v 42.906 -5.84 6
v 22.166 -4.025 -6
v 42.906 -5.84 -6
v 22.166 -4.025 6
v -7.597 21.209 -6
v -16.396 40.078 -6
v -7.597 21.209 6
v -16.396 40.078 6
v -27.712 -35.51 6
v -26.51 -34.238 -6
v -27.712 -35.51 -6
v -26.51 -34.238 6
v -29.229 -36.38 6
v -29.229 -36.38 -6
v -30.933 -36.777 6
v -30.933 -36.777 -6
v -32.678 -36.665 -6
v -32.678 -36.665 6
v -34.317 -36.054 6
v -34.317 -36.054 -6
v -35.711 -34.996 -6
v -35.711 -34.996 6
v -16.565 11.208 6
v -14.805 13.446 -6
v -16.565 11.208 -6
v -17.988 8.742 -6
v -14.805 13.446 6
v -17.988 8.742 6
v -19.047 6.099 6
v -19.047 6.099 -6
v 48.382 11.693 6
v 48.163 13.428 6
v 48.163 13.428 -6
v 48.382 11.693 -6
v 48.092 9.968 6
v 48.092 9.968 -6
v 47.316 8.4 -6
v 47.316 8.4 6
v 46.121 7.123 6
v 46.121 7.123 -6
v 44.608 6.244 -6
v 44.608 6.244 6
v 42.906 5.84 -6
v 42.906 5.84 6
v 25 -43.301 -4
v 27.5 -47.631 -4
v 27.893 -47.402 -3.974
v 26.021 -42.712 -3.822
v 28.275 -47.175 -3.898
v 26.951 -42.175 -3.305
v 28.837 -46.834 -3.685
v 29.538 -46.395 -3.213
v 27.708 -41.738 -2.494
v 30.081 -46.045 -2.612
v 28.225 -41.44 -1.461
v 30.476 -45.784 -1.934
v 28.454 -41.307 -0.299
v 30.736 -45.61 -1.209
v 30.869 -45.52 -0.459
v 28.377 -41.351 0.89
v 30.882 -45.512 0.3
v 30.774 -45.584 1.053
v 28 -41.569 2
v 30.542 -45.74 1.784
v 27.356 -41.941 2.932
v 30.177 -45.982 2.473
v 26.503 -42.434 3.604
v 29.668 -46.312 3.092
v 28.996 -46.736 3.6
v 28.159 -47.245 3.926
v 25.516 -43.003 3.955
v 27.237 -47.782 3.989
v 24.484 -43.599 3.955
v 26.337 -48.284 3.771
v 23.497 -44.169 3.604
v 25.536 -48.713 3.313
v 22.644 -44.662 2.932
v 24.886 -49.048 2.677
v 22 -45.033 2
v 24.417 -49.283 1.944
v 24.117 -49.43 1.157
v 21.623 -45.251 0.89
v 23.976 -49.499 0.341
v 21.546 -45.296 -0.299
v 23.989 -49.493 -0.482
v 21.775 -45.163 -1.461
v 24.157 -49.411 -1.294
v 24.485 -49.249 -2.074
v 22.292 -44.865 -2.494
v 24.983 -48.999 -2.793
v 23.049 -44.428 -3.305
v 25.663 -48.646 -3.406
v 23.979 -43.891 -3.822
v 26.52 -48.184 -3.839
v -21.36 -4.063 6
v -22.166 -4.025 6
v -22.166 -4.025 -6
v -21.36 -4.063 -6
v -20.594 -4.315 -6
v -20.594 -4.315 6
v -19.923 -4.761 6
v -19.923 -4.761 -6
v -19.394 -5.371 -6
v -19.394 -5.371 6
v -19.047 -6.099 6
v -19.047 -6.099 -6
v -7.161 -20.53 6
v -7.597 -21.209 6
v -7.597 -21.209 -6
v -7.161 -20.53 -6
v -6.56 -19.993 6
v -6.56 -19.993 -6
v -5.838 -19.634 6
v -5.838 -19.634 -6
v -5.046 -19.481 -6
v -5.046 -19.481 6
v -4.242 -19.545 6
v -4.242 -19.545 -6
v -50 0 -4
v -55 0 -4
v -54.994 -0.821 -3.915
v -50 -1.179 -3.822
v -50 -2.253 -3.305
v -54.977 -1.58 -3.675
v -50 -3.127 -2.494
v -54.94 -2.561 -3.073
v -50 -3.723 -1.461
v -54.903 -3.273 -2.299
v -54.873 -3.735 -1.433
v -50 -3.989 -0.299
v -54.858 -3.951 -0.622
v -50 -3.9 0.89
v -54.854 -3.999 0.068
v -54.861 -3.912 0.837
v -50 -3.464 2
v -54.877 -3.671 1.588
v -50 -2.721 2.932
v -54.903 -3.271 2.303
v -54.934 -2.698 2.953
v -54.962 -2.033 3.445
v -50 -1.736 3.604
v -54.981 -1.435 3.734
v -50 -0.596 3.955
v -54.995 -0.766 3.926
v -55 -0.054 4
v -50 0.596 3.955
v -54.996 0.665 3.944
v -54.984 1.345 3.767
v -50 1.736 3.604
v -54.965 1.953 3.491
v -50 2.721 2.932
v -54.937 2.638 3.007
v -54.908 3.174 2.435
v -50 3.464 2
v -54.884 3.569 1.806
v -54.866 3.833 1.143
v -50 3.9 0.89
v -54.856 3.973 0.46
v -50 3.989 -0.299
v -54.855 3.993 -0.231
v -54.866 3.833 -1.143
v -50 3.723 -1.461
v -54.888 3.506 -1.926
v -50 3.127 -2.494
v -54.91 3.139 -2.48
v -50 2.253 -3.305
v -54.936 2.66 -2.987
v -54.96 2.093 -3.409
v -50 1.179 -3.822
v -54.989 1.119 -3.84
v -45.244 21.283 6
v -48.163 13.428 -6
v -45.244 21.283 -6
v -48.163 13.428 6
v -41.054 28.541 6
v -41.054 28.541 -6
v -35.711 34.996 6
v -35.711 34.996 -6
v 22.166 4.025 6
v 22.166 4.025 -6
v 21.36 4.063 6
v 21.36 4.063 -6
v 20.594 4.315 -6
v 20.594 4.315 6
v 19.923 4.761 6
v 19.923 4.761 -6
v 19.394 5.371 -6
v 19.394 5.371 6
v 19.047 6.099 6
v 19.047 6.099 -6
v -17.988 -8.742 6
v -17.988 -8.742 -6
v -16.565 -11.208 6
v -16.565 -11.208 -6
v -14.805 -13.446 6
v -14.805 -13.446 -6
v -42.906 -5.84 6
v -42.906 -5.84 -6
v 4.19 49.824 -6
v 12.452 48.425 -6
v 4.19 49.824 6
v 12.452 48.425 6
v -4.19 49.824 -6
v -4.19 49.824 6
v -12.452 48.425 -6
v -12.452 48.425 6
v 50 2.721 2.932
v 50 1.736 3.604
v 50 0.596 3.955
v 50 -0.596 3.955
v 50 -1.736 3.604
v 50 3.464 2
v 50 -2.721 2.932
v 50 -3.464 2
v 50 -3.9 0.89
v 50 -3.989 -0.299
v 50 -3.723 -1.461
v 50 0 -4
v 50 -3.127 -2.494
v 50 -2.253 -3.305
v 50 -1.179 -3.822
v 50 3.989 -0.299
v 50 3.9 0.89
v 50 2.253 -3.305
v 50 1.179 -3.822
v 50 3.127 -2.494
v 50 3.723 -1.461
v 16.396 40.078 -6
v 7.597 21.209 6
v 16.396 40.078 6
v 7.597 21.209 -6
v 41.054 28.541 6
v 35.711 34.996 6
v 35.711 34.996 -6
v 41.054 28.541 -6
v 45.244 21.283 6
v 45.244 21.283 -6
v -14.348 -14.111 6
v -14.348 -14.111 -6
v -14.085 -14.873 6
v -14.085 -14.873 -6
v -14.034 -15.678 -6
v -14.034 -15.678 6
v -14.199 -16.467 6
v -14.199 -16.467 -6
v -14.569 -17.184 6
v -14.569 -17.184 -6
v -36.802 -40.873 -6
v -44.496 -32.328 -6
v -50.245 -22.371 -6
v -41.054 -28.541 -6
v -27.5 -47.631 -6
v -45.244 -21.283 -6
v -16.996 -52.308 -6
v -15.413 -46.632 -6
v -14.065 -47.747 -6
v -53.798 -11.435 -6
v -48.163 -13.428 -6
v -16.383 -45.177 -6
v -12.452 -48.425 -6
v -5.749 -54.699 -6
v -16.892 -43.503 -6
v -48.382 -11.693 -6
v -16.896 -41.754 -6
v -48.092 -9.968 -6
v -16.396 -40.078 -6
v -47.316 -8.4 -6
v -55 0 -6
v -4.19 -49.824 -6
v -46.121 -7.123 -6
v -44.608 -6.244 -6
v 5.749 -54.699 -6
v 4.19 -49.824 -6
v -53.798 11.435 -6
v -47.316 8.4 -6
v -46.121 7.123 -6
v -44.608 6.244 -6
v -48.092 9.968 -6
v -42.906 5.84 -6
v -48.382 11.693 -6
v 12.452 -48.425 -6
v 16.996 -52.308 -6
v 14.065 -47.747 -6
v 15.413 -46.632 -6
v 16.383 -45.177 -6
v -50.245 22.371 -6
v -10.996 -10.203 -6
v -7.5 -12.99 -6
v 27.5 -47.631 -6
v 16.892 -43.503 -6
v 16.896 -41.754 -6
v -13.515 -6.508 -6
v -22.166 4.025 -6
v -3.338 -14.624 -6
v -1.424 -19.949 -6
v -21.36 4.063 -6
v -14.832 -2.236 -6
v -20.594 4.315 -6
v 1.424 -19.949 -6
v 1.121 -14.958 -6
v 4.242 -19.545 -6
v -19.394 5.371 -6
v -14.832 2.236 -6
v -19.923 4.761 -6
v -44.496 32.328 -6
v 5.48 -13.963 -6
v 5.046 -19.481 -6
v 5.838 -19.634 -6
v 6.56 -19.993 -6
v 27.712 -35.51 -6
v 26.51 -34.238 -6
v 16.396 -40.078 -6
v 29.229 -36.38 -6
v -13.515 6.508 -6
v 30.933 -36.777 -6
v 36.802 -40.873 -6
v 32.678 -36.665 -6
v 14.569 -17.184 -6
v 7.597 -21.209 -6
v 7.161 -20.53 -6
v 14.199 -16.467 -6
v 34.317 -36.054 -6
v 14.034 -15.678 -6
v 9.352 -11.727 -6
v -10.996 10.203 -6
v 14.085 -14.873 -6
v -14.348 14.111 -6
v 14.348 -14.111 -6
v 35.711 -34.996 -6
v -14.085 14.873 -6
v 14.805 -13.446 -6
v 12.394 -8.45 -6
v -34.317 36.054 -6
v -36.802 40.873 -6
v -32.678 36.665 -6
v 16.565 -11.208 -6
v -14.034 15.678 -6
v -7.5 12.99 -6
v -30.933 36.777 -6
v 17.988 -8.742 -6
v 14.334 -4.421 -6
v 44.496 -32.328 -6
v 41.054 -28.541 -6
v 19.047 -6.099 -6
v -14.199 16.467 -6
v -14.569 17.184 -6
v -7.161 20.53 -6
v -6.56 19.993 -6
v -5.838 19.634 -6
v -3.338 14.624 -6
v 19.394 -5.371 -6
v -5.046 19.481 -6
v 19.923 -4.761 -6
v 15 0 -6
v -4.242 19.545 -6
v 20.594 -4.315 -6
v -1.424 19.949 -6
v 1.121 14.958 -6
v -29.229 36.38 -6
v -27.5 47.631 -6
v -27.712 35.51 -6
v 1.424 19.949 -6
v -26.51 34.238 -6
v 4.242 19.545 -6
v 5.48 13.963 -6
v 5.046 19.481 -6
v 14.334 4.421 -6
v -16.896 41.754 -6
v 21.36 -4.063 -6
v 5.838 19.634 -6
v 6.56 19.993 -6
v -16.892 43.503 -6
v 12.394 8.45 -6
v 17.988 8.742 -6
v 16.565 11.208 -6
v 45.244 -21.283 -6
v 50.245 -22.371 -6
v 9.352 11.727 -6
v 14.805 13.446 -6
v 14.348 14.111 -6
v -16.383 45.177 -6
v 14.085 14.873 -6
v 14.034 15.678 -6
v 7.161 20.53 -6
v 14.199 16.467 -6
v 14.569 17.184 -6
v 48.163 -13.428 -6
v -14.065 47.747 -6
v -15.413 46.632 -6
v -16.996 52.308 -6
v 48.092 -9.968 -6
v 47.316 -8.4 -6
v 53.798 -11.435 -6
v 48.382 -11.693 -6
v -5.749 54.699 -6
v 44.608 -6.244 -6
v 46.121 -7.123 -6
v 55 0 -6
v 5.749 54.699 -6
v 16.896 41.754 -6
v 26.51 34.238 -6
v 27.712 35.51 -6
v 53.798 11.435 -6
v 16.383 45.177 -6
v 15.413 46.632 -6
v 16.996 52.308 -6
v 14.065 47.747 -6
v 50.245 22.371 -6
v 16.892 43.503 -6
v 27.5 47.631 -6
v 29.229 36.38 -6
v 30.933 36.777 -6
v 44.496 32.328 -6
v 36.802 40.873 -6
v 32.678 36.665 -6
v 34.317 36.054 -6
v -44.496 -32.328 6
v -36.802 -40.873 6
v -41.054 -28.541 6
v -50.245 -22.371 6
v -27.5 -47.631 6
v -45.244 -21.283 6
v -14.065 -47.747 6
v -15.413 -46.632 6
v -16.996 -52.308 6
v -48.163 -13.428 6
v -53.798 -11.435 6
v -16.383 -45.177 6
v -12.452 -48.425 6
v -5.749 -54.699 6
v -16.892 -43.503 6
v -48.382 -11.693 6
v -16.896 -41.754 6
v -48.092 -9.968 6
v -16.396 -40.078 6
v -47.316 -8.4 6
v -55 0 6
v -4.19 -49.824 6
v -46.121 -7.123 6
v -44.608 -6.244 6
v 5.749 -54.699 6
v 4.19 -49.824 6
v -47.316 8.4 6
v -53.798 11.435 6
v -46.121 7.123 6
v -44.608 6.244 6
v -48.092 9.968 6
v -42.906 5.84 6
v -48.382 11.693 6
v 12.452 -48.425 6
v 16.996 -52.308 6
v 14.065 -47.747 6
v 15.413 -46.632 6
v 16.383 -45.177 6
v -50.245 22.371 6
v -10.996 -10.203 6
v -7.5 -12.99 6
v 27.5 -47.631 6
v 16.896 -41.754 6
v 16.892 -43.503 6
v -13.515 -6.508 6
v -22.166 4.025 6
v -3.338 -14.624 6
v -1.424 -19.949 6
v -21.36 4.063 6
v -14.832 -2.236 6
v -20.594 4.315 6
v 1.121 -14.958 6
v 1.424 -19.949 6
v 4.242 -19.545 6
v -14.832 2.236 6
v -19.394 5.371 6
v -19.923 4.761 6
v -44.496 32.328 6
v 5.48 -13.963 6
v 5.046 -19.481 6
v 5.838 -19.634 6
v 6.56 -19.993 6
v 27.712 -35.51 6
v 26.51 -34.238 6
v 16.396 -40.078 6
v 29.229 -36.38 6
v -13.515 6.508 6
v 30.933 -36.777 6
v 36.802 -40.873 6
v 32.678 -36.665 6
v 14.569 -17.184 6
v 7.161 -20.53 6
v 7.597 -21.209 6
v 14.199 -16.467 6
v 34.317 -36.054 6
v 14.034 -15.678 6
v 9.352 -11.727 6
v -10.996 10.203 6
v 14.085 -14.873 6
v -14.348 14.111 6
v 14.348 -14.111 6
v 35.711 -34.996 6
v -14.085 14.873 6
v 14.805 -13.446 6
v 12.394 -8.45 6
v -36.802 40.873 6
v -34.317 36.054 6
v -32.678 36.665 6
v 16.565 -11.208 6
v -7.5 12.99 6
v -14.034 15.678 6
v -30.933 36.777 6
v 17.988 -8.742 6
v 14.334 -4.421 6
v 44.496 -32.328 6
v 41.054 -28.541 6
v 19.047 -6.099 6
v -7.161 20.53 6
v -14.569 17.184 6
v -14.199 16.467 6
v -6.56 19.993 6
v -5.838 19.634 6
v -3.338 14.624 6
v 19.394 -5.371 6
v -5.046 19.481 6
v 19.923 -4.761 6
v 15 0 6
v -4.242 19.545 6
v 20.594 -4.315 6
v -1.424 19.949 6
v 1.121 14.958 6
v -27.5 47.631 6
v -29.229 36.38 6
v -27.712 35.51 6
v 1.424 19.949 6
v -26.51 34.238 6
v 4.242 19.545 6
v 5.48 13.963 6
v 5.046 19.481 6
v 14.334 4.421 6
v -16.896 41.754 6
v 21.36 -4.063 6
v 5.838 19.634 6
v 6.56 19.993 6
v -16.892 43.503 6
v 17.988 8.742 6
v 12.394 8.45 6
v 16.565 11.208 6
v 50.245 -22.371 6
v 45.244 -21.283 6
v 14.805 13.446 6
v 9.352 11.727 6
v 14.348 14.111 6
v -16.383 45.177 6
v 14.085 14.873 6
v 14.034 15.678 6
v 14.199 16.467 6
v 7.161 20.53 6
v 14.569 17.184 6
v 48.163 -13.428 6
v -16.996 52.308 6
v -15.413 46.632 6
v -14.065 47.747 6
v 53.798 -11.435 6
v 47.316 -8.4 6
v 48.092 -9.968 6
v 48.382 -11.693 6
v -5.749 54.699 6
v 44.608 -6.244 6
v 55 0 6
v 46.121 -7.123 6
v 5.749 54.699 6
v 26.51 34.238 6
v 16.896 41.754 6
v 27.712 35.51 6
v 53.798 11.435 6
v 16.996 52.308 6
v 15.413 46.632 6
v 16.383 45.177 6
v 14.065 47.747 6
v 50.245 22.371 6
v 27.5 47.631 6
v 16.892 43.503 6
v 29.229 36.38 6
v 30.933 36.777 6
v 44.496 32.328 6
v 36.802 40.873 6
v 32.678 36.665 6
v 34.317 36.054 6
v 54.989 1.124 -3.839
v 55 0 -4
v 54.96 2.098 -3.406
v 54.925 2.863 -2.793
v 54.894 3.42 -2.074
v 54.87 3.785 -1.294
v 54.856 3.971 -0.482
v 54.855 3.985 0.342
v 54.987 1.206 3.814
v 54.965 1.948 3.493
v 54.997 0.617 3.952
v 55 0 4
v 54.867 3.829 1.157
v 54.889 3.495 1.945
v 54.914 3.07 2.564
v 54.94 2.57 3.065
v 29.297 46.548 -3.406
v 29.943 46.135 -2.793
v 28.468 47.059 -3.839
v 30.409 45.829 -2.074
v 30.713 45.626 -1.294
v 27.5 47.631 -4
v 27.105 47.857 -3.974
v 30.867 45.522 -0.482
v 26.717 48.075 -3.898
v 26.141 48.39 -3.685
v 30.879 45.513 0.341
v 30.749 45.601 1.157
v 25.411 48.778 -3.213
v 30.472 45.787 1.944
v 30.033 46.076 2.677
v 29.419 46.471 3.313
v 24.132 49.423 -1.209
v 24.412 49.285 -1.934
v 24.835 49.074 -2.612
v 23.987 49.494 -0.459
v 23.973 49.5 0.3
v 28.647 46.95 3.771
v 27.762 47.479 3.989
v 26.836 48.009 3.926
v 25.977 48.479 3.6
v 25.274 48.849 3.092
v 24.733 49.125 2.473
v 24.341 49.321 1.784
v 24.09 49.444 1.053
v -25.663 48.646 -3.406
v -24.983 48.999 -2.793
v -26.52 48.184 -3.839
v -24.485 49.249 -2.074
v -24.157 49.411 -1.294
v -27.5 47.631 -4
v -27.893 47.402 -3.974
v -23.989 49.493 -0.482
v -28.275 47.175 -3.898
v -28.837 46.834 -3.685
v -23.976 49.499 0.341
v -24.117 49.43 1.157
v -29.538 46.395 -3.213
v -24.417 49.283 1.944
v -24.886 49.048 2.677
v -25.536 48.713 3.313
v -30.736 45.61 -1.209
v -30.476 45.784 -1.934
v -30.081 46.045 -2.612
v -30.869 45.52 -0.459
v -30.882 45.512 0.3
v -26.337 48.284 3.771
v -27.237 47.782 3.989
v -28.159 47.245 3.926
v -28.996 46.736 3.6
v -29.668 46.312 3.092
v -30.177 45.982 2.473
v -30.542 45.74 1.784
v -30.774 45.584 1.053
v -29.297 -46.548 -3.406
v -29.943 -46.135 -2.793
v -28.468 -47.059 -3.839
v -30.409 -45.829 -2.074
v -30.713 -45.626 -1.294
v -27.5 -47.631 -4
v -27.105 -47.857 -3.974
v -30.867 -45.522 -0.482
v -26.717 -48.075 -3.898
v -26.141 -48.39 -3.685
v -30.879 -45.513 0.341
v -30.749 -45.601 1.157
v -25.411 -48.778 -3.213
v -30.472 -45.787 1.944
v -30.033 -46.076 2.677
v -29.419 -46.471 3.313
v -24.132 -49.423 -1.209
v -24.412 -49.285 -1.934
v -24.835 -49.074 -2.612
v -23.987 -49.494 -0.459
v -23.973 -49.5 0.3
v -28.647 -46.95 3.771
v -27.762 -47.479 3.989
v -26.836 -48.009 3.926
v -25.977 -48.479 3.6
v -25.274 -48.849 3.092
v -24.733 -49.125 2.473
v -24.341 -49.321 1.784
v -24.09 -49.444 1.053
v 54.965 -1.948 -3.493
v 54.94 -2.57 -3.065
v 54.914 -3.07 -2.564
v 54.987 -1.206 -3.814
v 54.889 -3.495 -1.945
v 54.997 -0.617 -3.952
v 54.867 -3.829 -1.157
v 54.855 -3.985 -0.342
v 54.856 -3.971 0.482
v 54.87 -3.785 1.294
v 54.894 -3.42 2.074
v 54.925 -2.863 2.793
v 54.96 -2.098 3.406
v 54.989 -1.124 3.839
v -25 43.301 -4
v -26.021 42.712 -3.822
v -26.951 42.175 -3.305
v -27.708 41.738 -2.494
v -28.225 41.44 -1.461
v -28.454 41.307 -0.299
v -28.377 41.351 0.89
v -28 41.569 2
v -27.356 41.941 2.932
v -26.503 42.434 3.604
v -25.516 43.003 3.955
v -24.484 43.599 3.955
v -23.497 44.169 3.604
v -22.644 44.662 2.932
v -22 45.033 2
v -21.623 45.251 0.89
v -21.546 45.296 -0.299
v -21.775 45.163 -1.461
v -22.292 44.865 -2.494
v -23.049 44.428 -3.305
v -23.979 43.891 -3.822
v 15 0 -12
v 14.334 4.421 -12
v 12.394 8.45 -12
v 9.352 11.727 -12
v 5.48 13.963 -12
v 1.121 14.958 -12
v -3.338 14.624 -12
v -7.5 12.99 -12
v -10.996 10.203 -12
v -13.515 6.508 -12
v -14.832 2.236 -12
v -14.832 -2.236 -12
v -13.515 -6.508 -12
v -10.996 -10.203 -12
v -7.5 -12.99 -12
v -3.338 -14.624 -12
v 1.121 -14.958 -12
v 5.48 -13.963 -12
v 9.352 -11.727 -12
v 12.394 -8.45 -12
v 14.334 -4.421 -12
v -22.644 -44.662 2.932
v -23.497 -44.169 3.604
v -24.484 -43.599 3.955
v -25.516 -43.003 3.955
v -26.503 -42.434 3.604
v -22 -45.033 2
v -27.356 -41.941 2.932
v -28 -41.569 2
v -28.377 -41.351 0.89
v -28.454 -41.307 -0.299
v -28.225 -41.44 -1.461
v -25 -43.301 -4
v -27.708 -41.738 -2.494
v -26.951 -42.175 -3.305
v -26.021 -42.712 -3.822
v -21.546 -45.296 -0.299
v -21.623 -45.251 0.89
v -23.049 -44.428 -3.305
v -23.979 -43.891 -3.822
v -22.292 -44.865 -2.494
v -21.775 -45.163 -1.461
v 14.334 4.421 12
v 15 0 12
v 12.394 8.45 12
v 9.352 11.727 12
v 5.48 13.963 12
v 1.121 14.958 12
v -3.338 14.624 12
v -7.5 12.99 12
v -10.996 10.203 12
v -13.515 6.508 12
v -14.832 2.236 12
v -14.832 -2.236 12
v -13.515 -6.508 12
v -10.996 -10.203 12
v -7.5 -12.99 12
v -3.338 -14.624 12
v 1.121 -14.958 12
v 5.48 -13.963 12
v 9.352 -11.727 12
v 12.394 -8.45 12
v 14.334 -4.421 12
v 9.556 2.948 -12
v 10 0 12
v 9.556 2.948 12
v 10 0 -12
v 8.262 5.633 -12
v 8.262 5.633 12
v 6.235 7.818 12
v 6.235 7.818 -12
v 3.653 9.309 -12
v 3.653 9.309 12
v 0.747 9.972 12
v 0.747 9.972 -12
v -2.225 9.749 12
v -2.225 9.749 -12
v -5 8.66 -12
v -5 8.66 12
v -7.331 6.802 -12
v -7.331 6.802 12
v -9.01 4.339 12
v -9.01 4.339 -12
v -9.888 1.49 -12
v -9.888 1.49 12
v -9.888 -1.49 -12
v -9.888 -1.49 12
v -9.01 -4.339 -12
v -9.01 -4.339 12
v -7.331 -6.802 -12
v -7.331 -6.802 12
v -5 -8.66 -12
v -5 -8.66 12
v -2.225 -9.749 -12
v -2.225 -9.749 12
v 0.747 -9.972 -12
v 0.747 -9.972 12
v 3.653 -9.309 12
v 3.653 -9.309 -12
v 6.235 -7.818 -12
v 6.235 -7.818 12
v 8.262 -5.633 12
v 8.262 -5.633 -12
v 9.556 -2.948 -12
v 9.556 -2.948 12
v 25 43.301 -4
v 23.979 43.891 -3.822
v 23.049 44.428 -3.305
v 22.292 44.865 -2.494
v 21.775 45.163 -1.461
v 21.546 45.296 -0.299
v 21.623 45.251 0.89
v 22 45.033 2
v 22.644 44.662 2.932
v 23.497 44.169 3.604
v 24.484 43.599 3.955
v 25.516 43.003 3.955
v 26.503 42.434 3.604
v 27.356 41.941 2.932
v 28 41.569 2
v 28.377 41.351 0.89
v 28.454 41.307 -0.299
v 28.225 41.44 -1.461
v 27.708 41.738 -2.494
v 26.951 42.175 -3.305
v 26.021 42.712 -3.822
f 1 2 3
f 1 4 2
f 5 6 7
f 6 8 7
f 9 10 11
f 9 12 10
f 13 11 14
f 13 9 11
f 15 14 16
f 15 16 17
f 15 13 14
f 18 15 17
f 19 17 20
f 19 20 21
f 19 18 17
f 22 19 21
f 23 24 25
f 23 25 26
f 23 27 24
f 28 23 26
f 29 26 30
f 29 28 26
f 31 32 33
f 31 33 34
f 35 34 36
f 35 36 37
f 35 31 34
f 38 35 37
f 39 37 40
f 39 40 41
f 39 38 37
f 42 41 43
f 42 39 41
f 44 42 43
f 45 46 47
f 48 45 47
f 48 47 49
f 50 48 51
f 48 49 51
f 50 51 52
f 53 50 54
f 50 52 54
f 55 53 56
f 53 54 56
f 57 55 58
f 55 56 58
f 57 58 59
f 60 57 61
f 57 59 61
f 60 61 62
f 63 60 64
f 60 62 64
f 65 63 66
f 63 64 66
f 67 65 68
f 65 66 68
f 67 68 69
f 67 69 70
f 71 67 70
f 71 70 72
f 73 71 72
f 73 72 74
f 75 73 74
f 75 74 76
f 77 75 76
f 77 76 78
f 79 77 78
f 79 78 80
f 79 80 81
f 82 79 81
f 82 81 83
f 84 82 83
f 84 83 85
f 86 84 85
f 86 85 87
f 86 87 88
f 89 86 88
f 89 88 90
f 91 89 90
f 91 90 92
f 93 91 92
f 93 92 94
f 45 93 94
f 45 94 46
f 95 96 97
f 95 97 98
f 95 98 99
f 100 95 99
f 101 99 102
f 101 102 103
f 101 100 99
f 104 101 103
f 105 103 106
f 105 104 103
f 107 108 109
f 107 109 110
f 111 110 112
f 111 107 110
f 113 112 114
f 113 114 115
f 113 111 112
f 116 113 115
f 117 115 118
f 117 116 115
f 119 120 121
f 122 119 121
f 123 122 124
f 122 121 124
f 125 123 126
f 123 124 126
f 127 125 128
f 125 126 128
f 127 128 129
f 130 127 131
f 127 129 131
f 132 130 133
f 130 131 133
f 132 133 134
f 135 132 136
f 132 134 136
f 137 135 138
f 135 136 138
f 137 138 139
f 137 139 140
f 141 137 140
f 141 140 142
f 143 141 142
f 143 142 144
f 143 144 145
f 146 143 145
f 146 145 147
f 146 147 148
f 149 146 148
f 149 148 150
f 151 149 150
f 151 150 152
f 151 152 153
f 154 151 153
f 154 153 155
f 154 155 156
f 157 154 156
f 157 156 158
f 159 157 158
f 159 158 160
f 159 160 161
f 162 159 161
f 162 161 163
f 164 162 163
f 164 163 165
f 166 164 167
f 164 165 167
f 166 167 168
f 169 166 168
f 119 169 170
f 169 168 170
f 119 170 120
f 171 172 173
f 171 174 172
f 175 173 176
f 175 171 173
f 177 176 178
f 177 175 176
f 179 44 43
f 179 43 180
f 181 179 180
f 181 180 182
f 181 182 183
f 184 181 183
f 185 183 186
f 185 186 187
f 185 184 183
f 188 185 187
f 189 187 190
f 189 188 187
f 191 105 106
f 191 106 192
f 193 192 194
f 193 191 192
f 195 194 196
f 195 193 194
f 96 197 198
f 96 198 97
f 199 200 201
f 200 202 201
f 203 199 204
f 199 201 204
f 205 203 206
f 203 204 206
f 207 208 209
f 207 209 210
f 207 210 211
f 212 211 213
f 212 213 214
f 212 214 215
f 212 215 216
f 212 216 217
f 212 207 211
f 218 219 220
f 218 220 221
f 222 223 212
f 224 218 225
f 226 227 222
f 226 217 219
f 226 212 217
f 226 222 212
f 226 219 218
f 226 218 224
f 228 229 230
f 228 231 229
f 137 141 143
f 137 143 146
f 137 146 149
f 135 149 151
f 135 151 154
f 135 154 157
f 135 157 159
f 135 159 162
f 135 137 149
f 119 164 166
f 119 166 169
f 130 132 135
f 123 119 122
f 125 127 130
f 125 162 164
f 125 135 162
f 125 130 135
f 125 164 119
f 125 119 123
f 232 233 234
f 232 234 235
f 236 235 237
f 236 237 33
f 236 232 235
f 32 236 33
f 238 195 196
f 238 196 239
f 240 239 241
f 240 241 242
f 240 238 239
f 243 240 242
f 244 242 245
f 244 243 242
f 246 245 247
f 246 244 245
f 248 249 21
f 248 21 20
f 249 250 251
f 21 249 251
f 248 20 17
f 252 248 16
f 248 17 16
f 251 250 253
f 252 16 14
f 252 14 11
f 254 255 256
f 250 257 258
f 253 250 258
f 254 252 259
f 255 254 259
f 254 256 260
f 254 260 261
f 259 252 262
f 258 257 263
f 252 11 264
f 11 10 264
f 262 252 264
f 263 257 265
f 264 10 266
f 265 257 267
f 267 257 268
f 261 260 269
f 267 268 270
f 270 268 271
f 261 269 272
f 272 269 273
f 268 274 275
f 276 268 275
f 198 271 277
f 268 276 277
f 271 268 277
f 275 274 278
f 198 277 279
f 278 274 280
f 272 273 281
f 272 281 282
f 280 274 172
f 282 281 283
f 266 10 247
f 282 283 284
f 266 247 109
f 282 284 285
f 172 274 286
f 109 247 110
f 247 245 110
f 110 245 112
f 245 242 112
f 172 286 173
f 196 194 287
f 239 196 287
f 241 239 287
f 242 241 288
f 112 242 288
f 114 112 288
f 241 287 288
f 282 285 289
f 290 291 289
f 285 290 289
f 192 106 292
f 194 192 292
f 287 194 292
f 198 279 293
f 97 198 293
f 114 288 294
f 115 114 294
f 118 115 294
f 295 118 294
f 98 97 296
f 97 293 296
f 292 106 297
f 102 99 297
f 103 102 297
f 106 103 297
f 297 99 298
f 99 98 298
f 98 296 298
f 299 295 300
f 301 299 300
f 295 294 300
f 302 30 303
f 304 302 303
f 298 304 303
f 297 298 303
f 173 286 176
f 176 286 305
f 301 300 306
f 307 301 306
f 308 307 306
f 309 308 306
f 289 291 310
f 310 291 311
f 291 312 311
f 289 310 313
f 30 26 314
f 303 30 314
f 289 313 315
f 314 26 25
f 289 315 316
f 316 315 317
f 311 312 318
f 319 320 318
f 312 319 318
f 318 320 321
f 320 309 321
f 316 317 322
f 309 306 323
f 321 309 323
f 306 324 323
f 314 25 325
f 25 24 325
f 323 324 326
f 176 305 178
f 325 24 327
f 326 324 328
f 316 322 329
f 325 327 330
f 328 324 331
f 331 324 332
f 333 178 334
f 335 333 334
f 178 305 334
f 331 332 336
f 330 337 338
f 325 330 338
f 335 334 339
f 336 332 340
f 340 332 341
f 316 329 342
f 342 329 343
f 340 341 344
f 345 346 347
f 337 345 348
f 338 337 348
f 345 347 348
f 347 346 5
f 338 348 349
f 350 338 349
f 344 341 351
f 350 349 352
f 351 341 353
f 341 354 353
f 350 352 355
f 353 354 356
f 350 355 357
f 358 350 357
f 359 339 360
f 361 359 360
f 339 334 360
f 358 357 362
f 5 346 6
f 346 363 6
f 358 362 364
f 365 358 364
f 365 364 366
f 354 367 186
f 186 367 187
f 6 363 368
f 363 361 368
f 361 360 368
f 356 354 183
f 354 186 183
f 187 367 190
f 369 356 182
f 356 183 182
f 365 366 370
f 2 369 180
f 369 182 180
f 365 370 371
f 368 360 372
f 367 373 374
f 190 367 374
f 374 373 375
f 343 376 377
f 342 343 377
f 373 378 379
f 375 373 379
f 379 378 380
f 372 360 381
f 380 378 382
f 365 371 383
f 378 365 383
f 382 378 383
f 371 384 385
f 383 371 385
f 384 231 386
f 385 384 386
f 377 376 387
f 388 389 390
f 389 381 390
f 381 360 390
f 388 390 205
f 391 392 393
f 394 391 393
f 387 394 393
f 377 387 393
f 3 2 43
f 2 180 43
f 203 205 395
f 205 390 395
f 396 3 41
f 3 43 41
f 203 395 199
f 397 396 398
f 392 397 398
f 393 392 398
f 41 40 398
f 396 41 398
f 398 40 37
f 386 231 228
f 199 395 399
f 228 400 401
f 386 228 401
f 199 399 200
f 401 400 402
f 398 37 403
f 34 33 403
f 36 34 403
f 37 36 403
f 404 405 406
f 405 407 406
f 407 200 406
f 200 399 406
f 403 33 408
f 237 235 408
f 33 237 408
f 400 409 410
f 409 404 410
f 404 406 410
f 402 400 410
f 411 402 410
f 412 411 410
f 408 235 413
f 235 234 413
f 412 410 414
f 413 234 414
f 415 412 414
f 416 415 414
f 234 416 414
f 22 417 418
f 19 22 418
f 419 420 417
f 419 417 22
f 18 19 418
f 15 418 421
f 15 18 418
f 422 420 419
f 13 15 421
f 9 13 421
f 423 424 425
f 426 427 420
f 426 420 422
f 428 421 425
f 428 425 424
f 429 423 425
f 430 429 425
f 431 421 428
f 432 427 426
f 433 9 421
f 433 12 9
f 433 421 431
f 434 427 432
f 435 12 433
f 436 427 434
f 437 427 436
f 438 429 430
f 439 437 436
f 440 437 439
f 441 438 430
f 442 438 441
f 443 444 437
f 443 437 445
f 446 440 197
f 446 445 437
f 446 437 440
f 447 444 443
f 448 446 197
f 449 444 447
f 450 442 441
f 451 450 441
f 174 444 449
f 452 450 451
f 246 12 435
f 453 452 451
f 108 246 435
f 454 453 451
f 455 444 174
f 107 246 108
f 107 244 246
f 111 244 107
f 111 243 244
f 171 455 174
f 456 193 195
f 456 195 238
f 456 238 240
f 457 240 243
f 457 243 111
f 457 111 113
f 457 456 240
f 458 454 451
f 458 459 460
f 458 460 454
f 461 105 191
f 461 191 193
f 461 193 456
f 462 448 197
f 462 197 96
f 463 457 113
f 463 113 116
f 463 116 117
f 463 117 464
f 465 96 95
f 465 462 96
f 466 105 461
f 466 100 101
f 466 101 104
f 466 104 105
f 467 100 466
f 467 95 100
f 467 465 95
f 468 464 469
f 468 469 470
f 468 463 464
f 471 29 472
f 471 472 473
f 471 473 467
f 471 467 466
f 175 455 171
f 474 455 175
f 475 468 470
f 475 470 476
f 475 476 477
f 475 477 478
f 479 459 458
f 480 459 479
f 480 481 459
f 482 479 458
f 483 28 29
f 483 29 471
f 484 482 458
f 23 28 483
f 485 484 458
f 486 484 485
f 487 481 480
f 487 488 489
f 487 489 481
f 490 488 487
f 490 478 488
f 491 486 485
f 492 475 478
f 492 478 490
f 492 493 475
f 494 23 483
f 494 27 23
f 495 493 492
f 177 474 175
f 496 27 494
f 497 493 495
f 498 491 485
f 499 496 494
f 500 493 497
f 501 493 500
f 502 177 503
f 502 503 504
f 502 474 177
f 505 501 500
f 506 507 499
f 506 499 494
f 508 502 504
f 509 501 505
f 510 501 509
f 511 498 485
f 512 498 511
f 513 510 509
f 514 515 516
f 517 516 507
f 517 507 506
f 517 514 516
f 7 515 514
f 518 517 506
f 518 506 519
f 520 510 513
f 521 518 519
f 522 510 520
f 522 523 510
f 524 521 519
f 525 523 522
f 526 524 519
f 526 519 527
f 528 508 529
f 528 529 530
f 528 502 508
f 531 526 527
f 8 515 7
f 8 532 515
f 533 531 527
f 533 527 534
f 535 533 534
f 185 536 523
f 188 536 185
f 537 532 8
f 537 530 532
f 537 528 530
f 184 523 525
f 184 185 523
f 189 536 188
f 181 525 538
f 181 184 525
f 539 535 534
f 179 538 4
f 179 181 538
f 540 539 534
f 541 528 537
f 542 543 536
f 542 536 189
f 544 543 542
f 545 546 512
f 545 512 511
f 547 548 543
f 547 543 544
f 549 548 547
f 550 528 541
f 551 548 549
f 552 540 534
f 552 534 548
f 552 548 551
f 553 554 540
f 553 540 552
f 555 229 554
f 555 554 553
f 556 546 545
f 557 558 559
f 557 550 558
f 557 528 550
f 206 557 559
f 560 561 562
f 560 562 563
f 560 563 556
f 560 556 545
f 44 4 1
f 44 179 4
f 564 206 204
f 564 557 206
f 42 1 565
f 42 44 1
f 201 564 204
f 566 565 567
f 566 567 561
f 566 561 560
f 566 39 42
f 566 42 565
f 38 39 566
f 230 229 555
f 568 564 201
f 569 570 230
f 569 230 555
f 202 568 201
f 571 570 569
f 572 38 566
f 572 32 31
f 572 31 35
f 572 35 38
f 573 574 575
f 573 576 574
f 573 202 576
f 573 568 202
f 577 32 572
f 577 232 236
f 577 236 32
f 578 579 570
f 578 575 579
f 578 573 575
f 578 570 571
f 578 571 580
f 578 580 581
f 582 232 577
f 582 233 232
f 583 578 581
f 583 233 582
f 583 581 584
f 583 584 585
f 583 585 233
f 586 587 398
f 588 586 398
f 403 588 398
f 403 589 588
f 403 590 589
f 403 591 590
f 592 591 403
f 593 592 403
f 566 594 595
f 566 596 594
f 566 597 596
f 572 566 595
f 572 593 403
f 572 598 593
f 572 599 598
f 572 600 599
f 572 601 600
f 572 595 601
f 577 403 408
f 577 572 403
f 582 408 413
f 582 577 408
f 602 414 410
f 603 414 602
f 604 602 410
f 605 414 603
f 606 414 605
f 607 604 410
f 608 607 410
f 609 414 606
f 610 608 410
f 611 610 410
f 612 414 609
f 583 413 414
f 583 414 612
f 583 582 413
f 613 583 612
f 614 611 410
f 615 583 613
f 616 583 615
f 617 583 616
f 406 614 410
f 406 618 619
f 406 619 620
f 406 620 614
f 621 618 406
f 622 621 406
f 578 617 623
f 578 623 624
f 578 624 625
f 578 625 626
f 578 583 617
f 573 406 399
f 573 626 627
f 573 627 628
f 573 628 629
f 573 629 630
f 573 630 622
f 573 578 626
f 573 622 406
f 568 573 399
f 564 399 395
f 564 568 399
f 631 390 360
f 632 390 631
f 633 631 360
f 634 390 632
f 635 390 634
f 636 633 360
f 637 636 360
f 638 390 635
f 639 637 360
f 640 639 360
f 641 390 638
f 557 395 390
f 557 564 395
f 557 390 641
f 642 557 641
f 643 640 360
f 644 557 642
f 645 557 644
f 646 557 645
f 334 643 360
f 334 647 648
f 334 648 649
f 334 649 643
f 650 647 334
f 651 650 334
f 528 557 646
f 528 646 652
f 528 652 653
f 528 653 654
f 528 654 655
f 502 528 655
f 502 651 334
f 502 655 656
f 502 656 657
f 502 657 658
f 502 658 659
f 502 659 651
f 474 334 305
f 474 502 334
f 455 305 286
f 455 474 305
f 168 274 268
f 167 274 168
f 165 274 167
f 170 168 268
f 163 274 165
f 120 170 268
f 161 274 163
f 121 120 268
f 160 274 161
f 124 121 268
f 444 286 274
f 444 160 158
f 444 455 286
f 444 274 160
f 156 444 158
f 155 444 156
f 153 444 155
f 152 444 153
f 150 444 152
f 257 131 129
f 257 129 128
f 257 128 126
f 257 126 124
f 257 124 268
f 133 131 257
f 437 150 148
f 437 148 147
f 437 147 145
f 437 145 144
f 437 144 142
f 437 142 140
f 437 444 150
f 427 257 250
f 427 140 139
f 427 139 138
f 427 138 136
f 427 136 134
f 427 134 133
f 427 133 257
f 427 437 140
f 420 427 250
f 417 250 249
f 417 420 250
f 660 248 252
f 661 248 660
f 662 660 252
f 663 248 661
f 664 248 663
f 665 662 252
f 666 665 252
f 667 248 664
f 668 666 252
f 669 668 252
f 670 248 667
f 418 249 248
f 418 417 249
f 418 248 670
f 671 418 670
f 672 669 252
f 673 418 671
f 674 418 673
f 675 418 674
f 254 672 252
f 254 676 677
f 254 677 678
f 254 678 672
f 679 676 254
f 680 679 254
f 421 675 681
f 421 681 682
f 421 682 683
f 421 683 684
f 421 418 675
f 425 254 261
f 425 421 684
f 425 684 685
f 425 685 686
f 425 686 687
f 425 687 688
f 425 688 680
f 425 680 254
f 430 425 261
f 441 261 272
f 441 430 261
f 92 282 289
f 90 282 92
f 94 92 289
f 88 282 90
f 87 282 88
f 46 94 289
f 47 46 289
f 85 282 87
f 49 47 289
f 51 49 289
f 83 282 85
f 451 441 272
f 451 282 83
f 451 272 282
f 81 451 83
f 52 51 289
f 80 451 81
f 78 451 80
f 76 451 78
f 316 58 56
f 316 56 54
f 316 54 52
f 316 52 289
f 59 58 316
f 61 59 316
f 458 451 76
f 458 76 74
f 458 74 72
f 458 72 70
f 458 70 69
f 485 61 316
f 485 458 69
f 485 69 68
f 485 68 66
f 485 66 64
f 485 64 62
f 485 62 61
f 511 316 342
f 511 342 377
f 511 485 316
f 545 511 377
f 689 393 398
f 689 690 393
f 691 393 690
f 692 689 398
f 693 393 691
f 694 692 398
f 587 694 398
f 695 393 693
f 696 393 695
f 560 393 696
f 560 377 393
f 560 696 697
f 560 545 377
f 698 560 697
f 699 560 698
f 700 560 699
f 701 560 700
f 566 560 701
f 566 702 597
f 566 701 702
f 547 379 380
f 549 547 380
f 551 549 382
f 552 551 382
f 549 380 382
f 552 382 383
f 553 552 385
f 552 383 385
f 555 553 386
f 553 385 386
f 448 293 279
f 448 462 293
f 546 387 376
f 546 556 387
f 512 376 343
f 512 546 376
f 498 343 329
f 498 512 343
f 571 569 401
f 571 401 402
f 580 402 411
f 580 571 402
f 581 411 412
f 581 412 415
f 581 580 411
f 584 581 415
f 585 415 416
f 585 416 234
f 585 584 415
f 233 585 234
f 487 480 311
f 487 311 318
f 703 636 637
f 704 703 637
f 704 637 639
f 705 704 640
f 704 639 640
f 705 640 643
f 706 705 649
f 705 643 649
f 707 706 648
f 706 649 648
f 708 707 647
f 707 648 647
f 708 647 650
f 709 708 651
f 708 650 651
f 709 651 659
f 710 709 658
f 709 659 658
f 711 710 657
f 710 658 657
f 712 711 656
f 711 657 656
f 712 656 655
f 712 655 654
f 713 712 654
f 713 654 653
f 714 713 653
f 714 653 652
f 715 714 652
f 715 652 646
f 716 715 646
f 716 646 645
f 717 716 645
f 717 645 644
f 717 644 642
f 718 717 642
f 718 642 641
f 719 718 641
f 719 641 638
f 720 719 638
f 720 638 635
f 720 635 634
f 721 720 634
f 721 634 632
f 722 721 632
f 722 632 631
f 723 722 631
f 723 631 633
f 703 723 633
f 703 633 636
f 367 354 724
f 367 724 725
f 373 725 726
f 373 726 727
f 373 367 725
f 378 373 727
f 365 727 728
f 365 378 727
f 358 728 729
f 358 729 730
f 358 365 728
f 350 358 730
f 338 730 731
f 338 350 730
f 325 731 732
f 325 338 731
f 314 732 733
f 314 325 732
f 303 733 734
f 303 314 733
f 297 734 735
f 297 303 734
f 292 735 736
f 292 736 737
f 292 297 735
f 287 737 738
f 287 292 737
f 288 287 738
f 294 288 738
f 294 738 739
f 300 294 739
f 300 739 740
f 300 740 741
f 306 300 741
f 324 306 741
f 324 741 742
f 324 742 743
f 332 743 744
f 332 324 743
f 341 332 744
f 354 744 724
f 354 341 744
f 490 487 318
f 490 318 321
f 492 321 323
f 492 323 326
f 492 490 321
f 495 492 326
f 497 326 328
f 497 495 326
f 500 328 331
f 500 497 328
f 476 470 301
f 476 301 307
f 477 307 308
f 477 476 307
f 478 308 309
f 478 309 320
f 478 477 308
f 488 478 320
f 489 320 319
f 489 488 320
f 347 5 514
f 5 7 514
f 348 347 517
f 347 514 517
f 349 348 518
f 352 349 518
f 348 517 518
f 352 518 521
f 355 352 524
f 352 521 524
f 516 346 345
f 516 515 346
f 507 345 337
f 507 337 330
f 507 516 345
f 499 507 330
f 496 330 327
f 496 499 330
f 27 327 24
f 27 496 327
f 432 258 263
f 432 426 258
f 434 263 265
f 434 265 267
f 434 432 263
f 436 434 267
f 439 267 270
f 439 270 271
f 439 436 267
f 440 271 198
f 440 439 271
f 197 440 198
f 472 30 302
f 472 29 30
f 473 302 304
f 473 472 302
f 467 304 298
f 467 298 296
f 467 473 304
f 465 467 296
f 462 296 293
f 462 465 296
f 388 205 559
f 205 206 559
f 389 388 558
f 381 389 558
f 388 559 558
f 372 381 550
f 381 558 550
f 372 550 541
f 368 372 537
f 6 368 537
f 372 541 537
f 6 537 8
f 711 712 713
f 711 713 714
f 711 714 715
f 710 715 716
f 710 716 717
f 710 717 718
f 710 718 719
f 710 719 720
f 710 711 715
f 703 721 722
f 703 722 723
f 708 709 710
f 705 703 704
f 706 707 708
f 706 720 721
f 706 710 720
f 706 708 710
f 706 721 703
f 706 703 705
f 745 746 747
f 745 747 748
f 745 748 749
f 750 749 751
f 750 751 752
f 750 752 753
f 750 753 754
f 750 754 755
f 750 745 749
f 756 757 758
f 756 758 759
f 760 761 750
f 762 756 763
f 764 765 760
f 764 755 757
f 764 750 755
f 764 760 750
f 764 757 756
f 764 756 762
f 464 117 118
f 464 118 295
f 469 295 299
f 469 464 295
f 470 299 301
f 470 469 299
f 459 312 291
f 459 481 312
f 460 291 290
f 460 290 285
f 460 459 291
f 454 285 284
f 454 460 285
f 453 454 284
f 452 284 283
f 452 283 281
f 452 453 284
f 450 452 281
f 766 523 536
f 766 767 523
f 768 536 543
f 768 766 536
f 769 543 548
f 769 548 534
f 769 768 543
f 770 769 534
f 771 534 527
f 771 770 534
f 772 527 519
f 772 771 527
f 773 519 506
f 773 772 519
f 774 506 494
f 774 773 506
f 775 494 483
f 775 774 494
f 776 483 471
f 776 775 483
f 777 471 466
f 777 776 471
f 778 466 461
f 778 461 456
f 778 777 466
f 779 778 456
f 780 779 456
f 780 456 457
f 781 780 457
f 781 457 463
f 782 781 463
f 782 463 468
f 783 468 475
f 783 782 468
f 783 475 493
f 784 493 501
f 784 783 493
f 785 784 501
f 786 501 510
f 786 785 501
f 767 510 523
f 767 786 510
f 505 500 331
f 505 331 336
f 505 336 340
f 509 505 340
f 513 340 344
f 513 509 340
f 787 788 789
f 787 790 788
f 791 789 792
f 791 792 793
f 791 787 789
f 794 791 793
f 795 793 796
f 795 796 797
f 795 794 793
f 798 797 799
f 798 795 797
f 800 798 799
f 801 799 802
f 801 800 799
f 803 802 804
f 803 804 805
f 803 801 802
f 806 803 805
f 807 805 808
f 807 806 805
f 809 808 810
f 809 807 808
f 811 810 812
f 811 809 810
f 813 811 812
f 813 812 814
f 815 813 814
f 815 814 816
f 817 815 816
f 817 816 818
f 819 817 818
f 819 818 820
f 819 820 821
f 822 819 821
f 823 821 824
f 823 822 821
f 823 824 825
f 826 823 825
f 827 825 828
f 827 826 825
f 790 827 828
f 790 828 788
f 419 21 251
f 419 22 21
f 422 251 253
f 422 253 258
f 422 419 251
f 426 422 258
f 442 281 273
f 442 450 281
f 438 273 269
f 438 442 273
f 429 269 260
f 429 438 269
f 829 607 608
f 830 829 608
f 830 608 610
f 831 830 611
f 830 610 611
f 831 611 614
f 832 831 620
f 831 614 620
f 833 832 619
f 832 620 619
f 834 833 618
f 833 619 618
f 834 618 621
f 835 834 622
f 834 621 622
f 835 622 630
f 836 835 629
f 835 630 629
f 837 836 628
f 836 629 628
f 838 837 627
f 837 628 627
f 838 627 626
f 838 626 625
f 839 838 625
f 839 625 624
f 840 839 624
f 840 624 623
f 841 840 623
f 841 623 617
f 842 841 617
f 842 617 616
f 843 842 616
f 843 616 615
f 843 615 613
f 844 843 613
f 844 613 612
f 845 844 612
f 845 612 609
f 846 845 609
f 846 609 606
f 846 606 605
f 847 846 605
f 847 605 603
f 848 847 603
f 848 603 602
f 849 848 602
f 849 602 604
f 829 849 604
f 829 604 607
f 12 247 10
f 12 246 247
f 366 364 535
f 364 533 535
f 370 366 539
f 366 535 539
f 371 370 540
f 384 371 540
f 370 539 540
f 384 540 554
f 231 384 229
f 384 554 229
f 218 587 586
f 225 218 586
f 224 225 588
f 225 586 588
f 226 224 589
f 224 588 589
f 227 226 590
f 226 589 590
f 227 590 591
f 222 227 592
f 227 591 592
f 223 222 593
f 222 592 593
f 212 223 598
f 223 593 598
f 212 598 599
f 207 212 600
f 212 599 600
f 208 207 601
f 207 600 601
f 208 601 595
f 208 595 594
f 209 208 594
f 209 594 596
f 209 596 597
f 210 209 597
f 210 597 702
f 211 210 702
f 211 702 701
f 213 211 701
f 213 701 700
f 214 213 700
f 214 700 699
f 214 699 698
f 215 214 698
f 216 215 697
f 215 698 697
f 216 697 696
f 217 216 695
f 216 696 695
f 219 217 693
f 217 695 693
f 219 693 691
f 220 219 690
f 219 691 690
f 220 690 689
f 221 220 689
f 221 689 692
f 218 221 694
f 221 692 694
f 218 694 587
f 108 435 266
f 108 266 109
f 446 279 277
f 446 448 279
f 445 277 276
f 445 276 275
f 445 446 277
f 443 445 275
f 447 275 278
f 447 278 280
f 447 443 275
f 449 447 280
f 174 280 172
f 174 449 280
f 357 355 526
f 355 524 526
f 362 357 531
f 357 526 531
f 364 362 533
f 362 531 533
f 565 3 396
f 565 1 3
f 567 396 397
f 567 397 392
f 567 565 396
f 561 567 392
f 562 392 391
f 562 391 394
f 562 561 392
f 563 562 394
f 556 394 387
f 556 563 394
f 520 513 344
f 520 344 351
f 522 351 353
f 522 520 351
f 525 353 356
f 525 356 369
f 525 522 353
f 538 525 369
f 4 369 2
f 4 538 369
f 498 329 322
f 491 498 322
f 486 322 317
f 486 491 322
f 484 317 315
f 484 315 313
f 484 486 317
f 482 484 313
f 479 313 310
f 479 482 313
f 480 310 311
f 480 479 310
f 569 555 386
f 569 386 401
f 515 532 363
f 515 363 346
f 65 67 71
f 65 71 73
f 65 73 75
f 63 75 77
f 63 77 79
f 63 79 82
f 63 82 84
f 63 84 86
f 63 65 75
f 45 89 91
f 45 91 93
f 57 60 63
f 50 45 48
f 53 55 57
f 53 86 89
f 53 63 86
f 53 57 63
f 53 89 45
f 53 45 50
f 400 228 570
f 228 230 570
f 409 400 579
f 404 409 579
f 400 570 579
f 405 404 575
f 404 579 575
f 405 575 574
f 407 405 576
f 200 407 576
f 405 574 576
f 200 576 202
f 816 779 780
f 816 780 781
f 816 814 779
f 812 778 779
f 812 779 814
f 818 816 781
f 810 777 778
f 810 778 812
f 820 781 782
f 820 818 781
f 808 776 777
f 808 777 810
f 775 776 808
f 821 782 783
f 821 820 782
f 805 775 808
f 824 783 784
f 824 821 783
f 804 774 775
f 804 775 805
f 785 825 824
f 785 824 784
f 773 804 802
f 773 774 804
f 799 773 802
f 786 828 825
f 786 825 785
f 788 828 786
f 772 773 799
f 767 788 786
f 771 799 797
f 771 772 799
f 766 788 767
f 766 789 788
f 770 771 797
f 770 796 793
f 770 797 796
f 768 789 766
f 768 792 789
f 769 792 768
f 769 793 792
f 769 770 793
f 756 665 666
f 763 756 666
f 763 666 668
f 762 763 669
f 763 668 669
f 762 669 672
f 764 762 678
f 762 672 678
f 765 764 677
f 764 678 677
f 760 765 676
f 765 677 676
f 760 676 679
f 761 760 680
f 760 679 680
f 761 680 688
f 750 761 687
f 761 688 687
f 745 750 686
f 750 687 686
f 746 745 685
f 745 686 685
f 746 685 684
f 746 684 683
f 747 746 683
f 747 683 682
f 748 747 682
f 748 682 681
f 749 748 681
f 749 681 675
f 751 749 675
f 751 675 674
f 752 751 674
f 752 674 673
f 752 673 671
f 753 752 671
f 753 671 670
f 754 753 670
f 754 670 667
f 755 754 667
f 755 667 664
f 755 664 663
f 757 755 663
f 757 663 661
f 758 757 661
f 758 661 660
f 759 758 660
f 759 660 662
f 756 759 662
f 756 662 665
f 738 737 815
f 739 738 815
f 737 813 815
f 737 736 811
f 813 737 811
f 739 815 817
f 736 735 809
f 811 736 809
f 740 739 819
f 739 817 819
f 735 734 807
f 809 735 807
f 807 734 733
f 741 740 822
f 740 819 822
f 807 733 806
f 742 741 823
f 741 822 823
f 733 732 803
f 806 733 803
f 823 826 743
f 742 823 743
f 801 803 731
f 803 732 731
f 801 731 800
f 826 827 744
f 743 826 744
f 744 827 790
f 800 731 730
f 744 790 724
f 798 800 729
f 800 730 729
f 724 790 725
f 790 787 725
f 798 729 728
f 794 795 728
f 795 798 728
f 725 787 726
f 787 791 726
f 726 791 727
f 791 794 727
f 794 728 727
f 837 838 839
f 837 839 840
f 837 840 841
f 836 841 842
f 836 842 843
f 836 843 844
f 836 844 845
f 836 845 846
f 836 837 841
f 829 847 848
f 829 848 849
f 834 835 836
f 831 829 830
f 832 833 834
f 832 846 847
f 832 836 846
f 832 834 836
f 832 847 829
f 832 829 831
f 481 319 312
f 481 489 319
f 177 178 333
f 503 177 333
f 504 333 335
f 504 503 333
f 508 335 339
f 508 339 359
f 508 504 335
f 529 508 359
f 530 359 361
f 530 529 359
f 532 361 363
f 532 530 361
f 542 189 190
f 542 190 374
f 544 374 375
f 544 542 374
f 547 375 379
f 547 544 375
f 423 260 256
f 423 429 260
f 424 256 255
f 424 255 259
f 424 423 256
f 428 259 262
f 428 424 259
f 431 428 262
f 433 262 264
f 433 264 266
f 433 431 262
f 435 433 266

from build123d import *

# Parameters (mm, degrees)
CROQUIS1_R              = 15
CROQUIS1_R_2            = 10
SALIENTE_EXTRUIR1_DEPTH = 12
CROQUIS2_R              = 55
CROQUIS2_R_2            = 15
SALIENTE_EXTRUIR2_DEPTH = 6
CROQUIS4_R              = 4
CORTAR_EXTRUIR2_DEPTH   = 5
MATRIZC1_COUNT          = 6


with BuildPart() as part:
    # Croquis1 → Saliente-Extruir1 (new, symmetric)
    with BuildSketch(Plane.XY):
        Circle(CROQUIS1_R)
        Circle(CROQUIS1_R_2, mode=Mode.SUBTRACT)
    extrude(amount=SALIENTE_EXTRUIR1_DEPTH, both=True)

    # Croquis2 → Saliente-Extruir2 (add, symmetric)
    with BuildSketch(Plane.XY):
        Circle(CROQUIS2_R)
        Circle(CROQUIS2_R_2, mode=Mode.SUBTRACT)
        with BuildLine():
            Line((-16.39599659, 40.077890975), (-7.597218099, 21.20884961))
            ThreePointArc((-7.597218099, 21.20884961), (-6.21113479, 19.789040466), (-4.241995424, 19.544960343))
            ThreePointArc((-4.241995424, 19.544960343), (0, 20), (4.241995424, 19.544960343))
            ThreePointArc((4.241995424, 19.544960343), (6.21113479, 19.789040466), (7.597218099, 21.20884961))
            Line((7.597218099, 21.20884961), (16.39599659, 40.077890975))
            ThreePointArc((16.39599659, 40.077890975), (16.383120253, 45.176742429), (12.452443031, 48.424546075))
            ThreePointArc((12.452443031, 48.424546075), (0, 50), (-12.452443031, 48.424546075))
            ThreePointArc((-12.452443031, 48.424546075), (-16.383120253, 45.176742429), (-16.39599659, 40.077890975))
        make_face(mode=Mode.SUBTRACT)
        with BuildLine():
            Line((42.90647001, 5.83959592), (22.166011596, 4.025040933))
            ThreePointArc((22.166011596, 4.025040933), (20.243379154, 4.515519719), (19.047429885, 6.098804372))
            ThreePointArc((19.047429885, 6.098804372), (17.320508076, 10), (14.805434461, 13.446155972))
            ThreePointArc((14.805434461, 13.446155972), (14.032244365, 15.273520747), (14.568793497, 17.183808677))
            Line((14.568793497, 17.183808677), (26.51047342, 34.238295055))
            ThreePointArc((26.51047342, 34.238295055), (30.932646477, 36.776569547), (35.710665552, 34.996405042))
            ThreePointArc((35.710665552, 34.996405042), (43.301270189, 25), (48.163108583, 13.428141033))
            ThreePointArc((48.163108583, 13.428141033), (47.31576673, 8.400172882), (42.90647001, 5.83959592))
        make_face(mode=Mode.SUBTRACT)
        with BuildLine():
            Line((26.51047342, -34.238295055), (14.568793497, -17.183808677))
            ThreePointArc((14.568793497, -17.183808677), (14.032244365, -15.273520747), (14.805434461, -13.446155972))
            ThreePointArc((14.805434461, -13.446155972), (17.320508076, -10), (19.047429885, -6.098804372))
            ThreePointArc((19.047429885, -6.098804372), (20.243379154, -4.515519719), (22.166011596, -4.025040933))
            Line((22.166011596, -4.025040933), (42.90647001, -5.83959592))
            ThreePointArc((42.90647001, -5.83959592), (47.31576673, -8.400172882), (48.163108583, -13.428141033))
            ThreePointArc((48.163108583, -13.428141033), (43.301270189, -25), (35.710665552, -34.996405042))
            ThreePointArc((35.710665552, -34.996405042), (30.932646477, -36.776569547), (26.51047342, -34.238295055))
        make_face(mode=Mode.SUBTRACT)
        with BuildLine():
            Line((-16.39599659, -40.077890975), (-7.597218099, -21.20884961))
            ThreePointArc((-7.597218099, -21.20884961), (-6.21113479, -19.789040466), (-4.241995424, -19.544960343))
            ThreePointArc((-4.241995424, -19.544960343), (0, -20), (4.241995424, -19.544960343))
            ThreePointArc((4.241995424, -19.544960343), (6.21113479, -19.789040466), (7.597218099, -21.20884961))
            Line((7.597218099, -21.20884961), (16.39599659, -40.077890975))
            ThreePointArc((16.39599659, -40.077890975), (16.383120253, -45.176742429), (12.452443031, -48.424546075))
            ThreePointArc((12.452443031, -48.424546075), (0, -50), (-12.452443031, -48.424546075))
            ThreePointArc((-12.452443031, -48.424546075), (-16.383120253, -45.176742429), (-16.39599659, -40.077890975))
        make_face(mode=Mode.SUBTRACT)
        with BuildLine():
            Line((-42.90647001, -5.83959592), (-22.166011596, -4.025040933))
            ThreePointArc((-22.166011596, -4.025040933), (-20.243379154, -4.515519719), (-19.047429885, -6.098804372))
            ThreePointArc((-19.047429885, -6.098804372), (-17.320508076, -10), (-14.805434461, -13.446155972))
            ThreePointArc((-14.805434461, -13.446155972), (-14.032244365, -15.273520747), (-14.568793497, -17.183808677))
            Line((-14.568793497, -17.183808677), (-26.51047342, -34.238295055))
            ThreePointArc((-26.51047342, -34.238295055), (-30.932646477, -36.776569547), (-35.710665552, -34.996405042))
            ThreePointArc((-35.710665552, -34.996405042), (-43.301270189, -25), (-48.163108583, -13.428141033))
            ThreePointArc((-48.163108583, -13.428141033), (-47.31576673, -8.400172882), (-42.90647001, -5.83959592))
        make_face(mode=Mode.SUBTRACT)
        with BuildLine():
            Line((-26.51047342, 34.238295055), (-14.568793497, 17.183808677))
            ThreePointArc((-14.568793497, 17.183808677), (-14.032244365, 15.273520747), (-14.805434461, 13.446155972))
            ThreePointArc((-14.805434461, 13.446155972), (-17.320508076, 10), (-19.047429885, 6.098804372))
            ThreePointArc((-19.047429885, 6.098804372), (-20.243379154, 4.515519719), (-22.166011596, 4.025040933))
            Line((-22.166011596, 4.025040933), (-42.90647001, 5.83959592))
            ThreePointArc((-42.90647001, 5.83959592), (-47.31576673, 8.400172882), (-48.163108583, 13.428141033))
            ThreePointArc((-48.163108583, 13.428141033), (-43.301270189, 25), (-35.710665552, 34.996405042))
            ThreePointArc((-35.710665552, 34.996405042), (-30.932646477, 36.776569547), (-26.51047342, 34.238295055))
        make_face(mode=Mode.SUBTRACT)
    extrude(amount=SALIENTE_EXTRUIR2_DEPTH, both=True)

    # Croquis4 → Cortar-Extruir2 (cut)
    with BuildSketch(Plane(origin=(55, 0, 0), x_dir=(0, 0, -1), z_dir=(1, 0, 0))):
        Circle(CROQUIS4_R)
    cortar_extruir2 = extrude(amount=-CORTAR_EXTRUIR2_DEPTH, mode=Mode.SUBTRACT)

    # MatrizC1: Cortar-Extruir2 ×6 about axis
    matrizc1_axis = Axis((0, 0, 0), (0, 0, 1))
    for i in range(1, MATRIZC1_COUNT):
        add(cortar_extruir2.rotate(matrizc1_axis, i * 360 / MATRIZC1_COUNT), mode=Mode.SUBTRACT)


solid = part.part
